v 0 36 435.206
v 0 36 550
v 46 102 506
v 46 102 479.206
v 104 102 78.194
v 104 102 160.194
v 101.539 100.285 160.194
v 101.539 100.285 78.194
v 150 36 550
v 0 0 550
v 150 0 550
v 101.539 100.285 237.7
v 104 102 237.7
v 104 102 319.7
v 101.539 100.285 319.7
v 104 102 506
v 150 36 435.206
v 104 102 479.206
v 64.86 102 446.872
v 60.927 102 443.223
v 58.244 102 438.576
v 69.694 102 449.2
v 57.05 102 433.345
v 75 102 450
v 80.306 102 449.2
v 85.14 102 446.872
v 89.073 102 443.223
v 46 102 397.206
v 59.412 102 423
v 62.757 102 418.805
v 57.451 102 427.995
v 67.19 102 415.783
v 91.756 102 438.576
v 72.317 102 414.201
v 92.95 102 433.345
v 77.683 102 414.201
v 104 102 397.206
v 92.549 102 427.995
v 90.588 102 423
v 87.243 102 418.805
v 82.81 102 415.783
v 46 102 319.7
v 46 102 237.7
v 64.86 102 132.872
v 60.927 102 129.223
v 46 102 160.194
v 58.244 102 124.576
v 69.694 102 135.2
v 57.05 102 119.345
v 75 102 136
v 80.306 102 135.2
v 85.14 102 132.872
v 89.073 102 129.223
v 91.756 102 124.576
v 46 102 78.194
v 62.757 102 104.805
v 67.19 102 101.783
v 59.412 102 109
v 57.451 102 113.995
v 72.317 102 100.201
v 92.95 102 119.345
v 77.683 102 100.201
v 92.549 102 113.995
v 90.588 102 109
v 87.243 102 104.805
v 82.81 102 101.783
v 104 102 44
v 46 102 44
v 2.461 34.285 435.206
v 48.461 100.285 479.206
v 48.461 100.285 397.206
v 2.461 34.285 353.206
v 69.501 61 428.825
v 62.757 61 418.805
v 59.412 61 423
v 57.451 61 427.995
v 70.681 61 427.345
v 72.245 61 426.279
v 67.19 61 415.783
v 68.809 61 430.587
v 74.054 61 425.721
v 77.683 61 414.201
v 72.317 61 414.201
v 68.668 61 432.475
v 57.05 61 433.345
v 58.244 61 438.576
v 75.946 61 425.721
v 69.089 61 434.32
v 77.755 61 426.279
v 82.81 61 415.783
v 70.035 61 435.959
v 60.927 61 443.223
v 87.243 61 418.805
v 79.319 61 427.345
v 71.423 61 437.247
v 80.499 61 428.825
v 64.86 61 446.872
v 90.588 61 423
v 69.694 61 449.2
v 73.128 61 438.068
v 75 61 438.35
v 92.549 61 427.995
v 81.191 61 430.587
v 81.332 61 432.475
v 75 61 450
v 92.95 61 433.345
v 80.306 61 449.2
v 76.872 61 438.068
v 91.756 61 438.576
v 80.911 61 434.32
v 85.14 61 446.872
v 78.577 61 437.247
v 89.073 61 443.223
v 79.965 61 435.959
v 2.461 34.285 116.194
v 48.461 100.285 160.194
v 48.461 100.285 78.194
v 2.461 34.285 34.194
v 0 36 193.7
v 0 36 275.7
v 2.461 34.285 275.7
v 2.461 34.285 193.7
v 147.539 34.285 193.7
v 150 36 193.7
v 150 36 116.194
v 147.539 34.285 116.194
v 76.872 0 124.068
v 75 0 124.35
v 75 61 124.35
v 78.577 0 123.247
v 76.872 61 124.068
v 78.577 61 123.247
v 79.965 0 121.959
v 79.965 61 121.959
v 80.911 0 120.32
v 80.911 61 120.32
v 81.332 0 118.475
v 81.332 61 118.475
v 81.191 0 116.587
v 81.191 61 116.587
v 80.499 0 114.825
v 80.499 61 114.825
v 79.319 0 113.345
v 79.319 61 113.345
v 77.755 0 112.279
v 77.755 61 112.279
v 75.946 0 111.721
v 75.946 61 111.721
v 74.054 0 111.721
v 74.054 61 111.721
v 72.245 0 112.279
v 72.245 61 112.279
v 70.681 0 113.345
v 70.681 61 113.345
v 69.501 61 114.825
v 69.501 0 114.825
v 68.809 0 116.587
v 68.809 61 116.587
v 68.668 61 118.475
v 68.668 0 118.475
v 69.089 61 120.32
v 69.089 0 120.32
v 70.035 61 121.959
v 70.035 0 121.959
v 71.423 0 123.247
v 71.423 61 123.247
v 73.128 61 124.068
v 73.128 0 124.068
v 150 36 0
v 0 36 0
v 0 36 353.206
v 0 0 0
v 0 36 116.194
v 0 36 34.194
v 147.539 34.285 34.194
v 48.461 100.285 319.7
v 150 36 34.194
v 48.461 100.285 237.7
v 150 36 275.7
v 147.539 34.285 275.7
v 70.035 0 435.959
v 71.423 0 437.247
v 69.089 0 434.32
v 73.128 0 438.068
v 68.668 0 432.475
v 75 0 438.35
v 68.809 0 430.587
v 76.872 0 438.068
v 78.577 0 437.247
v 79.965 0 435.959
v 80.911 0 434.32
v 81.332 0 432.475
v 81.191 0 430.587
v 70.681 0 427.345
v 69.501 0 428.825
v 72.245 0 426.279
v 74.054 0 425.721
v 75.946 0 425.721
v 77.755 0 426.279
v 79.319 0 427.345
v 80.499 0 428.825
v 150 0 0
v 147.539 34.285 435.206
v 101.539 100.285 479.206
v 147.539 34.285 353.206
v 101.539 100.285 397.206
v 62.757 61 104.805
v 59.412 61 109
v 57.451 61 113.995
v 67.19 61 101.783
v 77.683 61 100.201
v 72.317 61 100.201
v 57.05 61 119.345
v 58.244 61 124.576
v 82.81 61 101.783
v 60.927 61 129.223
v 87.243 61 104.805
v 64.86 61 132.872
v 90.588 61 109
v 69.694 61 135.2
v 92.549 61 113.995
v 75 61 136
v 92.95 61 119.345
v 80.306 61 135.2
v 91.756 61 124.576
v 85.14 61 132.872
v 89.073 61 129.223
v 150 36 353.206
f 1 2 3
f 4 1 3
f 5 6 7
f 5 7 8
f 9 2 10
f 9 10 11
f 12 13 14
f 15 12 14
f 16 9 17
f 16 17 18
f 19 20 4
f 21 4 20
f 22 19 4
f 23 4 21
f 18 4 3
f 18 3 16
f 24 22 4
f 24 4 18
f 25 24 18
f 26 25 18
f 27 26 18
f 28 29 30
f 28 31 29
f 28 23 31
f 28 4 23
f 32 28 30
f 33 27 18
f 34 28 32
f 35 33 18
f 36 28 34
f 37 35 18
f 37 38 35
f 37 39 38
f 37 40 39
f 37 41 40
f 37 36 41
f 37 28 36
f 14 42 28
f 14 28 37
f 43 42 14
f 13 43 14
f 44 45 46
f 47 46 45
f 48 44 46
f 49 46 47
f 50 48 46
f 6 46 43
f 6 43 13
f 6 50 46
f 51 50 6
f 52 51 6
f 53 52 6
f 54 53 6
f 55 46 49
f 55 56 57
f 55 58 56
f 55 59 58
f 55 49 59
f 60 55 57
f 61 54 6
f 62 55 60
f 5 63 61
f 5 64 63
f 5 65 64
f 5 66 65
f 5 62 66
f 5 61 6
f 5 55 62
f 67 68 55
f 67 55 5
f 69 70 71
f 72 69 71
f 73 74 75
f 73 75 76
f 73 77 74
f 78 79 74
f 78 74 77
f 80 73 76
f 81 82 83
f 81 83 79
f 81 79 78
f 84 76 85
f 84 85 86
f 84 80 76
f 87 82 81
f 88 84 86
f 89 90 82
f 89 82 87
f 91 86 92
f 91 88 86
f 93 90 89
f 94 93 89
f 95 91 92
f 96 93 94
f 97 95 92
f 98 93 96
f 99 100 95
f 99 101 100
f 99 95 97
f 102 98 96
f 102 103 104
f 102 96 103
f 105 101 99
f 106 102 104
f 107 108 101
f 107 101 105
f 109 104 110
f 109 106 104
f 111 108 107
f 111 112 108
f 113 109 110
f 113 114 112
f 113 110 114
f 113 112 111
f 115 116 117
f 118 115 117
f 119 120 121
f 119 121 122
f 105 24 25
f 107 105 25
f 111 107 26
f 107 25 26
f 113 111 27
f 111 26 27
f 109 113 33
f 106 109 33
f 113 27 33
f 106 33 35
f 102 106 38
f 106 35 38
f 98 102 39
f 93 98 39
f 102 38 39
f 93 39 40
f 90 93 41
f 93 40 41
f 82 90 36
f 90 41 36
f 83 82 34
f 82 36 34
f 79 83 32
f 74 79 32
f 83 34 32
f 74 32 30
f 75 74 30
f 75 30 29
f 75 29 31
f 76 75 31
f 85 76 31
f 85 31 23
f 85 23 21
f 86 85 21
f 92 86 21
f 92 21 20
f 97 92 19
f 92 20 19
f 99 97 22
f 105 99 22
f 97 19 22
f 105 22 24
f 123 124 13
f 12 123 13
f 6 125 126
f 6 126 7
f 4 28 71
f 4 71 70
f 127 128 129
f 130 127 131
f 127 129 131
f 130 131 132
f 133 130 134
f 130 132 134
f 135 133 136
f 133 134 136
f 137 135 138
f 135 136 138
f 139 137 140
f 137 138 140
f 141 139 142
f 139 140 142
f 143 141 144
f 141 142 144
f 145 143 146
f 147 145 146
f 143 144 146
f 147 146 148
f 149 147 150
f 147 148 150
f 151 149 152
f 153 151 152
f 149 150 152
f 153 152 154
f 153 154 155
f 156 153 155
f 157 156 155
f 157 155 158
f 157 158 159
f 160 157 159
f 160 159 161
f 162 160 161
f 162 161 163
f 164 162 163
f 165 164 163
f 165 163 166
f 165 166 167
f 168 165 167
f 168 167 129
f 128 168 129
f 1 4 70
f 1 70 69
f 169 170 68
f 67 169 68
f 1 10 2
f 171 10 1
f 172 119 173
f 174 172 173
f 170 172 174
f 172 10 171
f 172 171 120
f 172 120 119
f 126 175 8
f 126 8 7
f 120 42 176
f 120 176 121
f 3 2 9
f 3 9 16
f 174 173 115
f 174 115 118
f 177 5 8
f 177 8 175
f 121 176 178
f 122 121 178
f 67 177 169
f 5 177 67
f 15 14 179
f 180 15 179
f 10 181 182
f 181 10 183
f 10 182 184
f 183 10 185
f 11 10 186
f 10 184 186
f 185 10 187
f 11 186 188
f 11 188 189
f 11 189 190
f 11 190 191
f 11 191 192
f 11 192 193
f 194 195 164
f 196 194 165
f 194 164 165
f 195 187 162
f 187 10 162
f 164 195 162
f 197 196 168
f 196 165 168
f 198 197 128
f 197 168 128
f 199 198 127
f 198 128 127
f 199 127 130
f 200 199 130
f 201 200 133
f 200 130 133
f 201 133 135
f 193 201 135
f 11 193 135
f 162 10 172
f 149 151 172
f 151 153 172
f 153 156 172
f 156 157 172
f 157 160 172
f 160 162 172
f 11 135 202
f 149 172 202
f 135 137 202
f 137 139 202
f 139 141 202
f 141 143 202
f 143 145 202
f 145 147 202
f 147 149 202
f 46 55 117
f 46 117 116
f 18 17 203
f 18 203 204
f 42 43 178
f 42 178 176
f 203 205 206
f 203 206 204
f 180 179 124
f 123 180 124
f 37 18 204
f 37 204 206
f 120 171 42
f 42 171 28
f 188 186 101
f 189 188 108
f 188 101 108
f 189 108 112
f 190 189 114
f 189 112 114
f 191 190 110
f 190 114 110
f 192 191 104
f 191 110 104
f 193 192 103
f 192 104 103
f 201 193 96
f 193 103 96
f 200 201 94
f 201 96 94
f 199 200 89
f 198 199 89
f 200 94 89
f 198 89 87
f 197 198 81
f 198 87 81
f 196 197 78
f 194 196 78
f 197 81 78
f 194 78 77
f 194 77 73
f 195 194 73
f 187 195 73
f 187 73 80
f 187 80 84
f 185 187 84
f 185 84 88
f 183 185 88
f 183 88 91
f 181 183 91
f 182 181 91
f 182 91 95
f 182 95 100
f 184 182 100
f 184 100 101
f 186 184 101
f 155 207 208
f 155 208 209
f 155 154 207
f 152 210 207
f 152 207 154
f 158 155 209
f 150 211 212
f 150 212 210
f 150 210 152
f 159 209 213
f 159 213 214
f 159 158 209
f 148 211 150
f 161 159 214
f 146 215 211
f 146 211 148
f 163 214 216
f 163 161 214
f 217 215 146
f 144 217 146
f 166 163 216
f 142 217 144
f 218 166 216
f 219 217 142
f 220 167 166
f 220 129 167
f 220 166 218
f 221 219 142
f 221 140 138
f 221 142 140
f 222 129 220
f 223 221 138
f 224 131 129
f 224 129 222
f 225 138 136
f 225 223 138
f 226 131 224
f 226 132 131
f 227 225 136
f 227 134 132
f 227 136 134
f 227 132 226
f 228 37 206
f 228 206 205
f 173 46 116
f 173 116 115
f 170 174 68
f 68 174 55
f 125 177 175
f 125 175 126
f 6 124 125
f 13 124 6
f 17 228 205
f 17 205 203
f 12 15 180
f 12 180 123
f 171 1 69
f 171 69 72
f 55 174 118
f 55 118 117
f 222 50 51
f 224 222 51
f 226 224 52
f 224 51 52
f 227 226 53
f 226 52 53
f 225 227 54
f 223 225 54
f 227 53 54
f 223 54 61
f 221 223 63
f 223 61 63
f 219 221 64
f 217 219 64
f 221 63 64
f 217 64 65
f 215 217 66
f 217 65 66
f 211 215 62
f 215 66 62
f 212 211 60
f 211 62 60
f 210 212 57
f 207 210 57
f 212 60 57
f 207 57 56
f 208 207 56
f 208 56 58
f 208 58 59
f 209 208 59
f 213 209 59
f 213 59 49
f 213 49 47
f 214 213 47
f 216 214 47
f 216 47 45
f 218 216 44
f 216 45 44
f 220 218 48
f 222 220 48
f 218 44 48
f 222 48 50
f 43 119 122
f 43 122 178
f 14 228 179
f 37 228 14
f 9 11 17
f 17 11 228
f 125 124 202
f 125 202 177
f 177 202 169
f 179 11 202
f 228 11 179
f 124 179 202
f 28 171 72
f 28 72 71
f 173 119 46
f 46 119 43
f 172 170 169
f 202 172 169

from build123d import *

# Parameters (mm, degrees)
CROQUIS1_W              = 150
CROQUIS1_H              = 102
SALIENTE_EXTRUIR1_DEPTH = 550
CORTAR_EXTRUIR1_DEPTH   = 550
CORTAR_EXTRUIR2_DEPTH   = 500
CORTAR_EXTRUIR3_DEPTH   = 3
CORTAR_EXTRUIR4_DEPTH   = 3
CROQUIS6_R              = 6.35
CORTAR_EXTRUIR5_DEPTH   = 102
CROQUIS7_R              = 18
CORTAR_EXTRUIR6_DEPTH   = 41


with BuildPart() as part:
    # Croquis1 → Saliente-Extruir1 (new body)
    with BuildSketch(Plane.XY):
        with Locations((75, 51)):
            Rectangle(CROQUIS1_W, CROQUIS1_H)
    extrude(amount=SALIENTE_EXTRUIR1_DEPTH)

    # Croquis2 → Cortar-Extruir1 (cut)
    with BuildSketch(Plane.XY.offset(550)):
        Polygon((0, 36), (46, 102), (-6.726685703, 105.184971584), align=None)
        Polygon((150, 36), (104, 102), (154.547307418, 106.586000482), align=None)
    extrude(amount=-CORTAR_EXTRUIR1_DEPTH, mode=Mode.SUBTRACT)

    # Croquis3 → Cortar-Extruir2 (cut)
    with BuildSketch(Plane.ZY):
        Polygon((0, 36), (44, 102), (0, 102), align=None)
        Polygon((550, 36), (506, 102), (550, 102), align=None)
    extrude(amount=-CORTAR_EXTRUIR2_DEPTH, mode=Mode.SUBTRACT)

    # Croquis4 → Cortar-Extruir3 (cut)
    with BuildSketch(Plane(origin=(-16.887515451, 11.770086527, 0), x_dir=(0, 0, 1), z_dir=(-0.8203981667699868, 0.5717926616881726, 0))):
        Polygon((34.193877534, 29.534334004), (78.193877534, 109.983075448), (160.193877534, 109.983075448), (116.193877534, 29.534334004), align=None)
        Polygon((193.699999945, 29.534334004), (237.699999945, 109.983075448), (319.699999945, 109.983075448), (275.699999945, 29.534334004), align=None)
        Polygon((353.206122355, 29.534334004), (397.206122355, 109.983075448), (479.206122355, 109.983075448), (435.206122355, 29.534334004), align=None)
    extrude(amount=-CORTAR_EXTRUIR3_DEPTH, mode=Mode.SUBTRACT)

    # Croquis5 → Cortar-Extruir4 (cut)
    with BuildSketch(Plane(origin=(117.845488257, 82.13473424, 0), x_dir=(0, 0, -1), z_dir=(0.8203981667699864, 0.5717926616881731, 0))):
        Polygon((-78.193877534, 24.214176195), (-34.193877534, -56.23456525), (-116.193877534, -56.23456525), (-160.193877534, 24.214176195), align=None)
        Polygon((-193.699999945, -56.23456525), (-237.699999945, 24.214176195), (-319.699999945, 24.214176195), (-275.699999945, -56.23456525), align=None)
        Polygon((-397.206122355, 24.214176195), (-353.206122355, -56.23456525), (-435.206122355, -56.23456525), (-479.206122355, 24.214176195), align=None)
    extrude(amount=-CORTAR_EXTRUIR4_DEPTH, mode=Mode.SUBTRACT)

    # Croquis6 → Cortar-Extruir5 (cut)
    with BuildSketch(Plane(origin=(0, 102, 0), x_dir=(1, 0, 0), z_dir=(0, 1, 0))):
        with Locations(Location((75, -118, 0), (0, 0, 270))):
            Circle(CROQUIS6_R)
        with Locations(Location((75, -432, 0), (0, 0, 270))):
            Circle(CROQUIS6_R)
    extrude(amount=-CORTAR_EXTRUIR5_DEPTH, mode=Mode.SUBTRACT)

    # Croquis7 → Cortar-Extruir6 (cut)
    with BuildSketch(Plane(origin=(0, 102, 0), x_dir=(1, 0, 0), z_dir=(0, 1, 0))):
        with Locations(Location((75, -118, 0), (0, 0, 270))):
            Circle(CROQUIS7_R)
        with Locations(Location((75, -432, 0), (0, 0, 270))):
            Circle(CROQUIS7_R)
    extrude(amount=-CORTAR_EXTRUIR6_DEPTH, mode=Mode.SUBTRACT)


solid = part.part
